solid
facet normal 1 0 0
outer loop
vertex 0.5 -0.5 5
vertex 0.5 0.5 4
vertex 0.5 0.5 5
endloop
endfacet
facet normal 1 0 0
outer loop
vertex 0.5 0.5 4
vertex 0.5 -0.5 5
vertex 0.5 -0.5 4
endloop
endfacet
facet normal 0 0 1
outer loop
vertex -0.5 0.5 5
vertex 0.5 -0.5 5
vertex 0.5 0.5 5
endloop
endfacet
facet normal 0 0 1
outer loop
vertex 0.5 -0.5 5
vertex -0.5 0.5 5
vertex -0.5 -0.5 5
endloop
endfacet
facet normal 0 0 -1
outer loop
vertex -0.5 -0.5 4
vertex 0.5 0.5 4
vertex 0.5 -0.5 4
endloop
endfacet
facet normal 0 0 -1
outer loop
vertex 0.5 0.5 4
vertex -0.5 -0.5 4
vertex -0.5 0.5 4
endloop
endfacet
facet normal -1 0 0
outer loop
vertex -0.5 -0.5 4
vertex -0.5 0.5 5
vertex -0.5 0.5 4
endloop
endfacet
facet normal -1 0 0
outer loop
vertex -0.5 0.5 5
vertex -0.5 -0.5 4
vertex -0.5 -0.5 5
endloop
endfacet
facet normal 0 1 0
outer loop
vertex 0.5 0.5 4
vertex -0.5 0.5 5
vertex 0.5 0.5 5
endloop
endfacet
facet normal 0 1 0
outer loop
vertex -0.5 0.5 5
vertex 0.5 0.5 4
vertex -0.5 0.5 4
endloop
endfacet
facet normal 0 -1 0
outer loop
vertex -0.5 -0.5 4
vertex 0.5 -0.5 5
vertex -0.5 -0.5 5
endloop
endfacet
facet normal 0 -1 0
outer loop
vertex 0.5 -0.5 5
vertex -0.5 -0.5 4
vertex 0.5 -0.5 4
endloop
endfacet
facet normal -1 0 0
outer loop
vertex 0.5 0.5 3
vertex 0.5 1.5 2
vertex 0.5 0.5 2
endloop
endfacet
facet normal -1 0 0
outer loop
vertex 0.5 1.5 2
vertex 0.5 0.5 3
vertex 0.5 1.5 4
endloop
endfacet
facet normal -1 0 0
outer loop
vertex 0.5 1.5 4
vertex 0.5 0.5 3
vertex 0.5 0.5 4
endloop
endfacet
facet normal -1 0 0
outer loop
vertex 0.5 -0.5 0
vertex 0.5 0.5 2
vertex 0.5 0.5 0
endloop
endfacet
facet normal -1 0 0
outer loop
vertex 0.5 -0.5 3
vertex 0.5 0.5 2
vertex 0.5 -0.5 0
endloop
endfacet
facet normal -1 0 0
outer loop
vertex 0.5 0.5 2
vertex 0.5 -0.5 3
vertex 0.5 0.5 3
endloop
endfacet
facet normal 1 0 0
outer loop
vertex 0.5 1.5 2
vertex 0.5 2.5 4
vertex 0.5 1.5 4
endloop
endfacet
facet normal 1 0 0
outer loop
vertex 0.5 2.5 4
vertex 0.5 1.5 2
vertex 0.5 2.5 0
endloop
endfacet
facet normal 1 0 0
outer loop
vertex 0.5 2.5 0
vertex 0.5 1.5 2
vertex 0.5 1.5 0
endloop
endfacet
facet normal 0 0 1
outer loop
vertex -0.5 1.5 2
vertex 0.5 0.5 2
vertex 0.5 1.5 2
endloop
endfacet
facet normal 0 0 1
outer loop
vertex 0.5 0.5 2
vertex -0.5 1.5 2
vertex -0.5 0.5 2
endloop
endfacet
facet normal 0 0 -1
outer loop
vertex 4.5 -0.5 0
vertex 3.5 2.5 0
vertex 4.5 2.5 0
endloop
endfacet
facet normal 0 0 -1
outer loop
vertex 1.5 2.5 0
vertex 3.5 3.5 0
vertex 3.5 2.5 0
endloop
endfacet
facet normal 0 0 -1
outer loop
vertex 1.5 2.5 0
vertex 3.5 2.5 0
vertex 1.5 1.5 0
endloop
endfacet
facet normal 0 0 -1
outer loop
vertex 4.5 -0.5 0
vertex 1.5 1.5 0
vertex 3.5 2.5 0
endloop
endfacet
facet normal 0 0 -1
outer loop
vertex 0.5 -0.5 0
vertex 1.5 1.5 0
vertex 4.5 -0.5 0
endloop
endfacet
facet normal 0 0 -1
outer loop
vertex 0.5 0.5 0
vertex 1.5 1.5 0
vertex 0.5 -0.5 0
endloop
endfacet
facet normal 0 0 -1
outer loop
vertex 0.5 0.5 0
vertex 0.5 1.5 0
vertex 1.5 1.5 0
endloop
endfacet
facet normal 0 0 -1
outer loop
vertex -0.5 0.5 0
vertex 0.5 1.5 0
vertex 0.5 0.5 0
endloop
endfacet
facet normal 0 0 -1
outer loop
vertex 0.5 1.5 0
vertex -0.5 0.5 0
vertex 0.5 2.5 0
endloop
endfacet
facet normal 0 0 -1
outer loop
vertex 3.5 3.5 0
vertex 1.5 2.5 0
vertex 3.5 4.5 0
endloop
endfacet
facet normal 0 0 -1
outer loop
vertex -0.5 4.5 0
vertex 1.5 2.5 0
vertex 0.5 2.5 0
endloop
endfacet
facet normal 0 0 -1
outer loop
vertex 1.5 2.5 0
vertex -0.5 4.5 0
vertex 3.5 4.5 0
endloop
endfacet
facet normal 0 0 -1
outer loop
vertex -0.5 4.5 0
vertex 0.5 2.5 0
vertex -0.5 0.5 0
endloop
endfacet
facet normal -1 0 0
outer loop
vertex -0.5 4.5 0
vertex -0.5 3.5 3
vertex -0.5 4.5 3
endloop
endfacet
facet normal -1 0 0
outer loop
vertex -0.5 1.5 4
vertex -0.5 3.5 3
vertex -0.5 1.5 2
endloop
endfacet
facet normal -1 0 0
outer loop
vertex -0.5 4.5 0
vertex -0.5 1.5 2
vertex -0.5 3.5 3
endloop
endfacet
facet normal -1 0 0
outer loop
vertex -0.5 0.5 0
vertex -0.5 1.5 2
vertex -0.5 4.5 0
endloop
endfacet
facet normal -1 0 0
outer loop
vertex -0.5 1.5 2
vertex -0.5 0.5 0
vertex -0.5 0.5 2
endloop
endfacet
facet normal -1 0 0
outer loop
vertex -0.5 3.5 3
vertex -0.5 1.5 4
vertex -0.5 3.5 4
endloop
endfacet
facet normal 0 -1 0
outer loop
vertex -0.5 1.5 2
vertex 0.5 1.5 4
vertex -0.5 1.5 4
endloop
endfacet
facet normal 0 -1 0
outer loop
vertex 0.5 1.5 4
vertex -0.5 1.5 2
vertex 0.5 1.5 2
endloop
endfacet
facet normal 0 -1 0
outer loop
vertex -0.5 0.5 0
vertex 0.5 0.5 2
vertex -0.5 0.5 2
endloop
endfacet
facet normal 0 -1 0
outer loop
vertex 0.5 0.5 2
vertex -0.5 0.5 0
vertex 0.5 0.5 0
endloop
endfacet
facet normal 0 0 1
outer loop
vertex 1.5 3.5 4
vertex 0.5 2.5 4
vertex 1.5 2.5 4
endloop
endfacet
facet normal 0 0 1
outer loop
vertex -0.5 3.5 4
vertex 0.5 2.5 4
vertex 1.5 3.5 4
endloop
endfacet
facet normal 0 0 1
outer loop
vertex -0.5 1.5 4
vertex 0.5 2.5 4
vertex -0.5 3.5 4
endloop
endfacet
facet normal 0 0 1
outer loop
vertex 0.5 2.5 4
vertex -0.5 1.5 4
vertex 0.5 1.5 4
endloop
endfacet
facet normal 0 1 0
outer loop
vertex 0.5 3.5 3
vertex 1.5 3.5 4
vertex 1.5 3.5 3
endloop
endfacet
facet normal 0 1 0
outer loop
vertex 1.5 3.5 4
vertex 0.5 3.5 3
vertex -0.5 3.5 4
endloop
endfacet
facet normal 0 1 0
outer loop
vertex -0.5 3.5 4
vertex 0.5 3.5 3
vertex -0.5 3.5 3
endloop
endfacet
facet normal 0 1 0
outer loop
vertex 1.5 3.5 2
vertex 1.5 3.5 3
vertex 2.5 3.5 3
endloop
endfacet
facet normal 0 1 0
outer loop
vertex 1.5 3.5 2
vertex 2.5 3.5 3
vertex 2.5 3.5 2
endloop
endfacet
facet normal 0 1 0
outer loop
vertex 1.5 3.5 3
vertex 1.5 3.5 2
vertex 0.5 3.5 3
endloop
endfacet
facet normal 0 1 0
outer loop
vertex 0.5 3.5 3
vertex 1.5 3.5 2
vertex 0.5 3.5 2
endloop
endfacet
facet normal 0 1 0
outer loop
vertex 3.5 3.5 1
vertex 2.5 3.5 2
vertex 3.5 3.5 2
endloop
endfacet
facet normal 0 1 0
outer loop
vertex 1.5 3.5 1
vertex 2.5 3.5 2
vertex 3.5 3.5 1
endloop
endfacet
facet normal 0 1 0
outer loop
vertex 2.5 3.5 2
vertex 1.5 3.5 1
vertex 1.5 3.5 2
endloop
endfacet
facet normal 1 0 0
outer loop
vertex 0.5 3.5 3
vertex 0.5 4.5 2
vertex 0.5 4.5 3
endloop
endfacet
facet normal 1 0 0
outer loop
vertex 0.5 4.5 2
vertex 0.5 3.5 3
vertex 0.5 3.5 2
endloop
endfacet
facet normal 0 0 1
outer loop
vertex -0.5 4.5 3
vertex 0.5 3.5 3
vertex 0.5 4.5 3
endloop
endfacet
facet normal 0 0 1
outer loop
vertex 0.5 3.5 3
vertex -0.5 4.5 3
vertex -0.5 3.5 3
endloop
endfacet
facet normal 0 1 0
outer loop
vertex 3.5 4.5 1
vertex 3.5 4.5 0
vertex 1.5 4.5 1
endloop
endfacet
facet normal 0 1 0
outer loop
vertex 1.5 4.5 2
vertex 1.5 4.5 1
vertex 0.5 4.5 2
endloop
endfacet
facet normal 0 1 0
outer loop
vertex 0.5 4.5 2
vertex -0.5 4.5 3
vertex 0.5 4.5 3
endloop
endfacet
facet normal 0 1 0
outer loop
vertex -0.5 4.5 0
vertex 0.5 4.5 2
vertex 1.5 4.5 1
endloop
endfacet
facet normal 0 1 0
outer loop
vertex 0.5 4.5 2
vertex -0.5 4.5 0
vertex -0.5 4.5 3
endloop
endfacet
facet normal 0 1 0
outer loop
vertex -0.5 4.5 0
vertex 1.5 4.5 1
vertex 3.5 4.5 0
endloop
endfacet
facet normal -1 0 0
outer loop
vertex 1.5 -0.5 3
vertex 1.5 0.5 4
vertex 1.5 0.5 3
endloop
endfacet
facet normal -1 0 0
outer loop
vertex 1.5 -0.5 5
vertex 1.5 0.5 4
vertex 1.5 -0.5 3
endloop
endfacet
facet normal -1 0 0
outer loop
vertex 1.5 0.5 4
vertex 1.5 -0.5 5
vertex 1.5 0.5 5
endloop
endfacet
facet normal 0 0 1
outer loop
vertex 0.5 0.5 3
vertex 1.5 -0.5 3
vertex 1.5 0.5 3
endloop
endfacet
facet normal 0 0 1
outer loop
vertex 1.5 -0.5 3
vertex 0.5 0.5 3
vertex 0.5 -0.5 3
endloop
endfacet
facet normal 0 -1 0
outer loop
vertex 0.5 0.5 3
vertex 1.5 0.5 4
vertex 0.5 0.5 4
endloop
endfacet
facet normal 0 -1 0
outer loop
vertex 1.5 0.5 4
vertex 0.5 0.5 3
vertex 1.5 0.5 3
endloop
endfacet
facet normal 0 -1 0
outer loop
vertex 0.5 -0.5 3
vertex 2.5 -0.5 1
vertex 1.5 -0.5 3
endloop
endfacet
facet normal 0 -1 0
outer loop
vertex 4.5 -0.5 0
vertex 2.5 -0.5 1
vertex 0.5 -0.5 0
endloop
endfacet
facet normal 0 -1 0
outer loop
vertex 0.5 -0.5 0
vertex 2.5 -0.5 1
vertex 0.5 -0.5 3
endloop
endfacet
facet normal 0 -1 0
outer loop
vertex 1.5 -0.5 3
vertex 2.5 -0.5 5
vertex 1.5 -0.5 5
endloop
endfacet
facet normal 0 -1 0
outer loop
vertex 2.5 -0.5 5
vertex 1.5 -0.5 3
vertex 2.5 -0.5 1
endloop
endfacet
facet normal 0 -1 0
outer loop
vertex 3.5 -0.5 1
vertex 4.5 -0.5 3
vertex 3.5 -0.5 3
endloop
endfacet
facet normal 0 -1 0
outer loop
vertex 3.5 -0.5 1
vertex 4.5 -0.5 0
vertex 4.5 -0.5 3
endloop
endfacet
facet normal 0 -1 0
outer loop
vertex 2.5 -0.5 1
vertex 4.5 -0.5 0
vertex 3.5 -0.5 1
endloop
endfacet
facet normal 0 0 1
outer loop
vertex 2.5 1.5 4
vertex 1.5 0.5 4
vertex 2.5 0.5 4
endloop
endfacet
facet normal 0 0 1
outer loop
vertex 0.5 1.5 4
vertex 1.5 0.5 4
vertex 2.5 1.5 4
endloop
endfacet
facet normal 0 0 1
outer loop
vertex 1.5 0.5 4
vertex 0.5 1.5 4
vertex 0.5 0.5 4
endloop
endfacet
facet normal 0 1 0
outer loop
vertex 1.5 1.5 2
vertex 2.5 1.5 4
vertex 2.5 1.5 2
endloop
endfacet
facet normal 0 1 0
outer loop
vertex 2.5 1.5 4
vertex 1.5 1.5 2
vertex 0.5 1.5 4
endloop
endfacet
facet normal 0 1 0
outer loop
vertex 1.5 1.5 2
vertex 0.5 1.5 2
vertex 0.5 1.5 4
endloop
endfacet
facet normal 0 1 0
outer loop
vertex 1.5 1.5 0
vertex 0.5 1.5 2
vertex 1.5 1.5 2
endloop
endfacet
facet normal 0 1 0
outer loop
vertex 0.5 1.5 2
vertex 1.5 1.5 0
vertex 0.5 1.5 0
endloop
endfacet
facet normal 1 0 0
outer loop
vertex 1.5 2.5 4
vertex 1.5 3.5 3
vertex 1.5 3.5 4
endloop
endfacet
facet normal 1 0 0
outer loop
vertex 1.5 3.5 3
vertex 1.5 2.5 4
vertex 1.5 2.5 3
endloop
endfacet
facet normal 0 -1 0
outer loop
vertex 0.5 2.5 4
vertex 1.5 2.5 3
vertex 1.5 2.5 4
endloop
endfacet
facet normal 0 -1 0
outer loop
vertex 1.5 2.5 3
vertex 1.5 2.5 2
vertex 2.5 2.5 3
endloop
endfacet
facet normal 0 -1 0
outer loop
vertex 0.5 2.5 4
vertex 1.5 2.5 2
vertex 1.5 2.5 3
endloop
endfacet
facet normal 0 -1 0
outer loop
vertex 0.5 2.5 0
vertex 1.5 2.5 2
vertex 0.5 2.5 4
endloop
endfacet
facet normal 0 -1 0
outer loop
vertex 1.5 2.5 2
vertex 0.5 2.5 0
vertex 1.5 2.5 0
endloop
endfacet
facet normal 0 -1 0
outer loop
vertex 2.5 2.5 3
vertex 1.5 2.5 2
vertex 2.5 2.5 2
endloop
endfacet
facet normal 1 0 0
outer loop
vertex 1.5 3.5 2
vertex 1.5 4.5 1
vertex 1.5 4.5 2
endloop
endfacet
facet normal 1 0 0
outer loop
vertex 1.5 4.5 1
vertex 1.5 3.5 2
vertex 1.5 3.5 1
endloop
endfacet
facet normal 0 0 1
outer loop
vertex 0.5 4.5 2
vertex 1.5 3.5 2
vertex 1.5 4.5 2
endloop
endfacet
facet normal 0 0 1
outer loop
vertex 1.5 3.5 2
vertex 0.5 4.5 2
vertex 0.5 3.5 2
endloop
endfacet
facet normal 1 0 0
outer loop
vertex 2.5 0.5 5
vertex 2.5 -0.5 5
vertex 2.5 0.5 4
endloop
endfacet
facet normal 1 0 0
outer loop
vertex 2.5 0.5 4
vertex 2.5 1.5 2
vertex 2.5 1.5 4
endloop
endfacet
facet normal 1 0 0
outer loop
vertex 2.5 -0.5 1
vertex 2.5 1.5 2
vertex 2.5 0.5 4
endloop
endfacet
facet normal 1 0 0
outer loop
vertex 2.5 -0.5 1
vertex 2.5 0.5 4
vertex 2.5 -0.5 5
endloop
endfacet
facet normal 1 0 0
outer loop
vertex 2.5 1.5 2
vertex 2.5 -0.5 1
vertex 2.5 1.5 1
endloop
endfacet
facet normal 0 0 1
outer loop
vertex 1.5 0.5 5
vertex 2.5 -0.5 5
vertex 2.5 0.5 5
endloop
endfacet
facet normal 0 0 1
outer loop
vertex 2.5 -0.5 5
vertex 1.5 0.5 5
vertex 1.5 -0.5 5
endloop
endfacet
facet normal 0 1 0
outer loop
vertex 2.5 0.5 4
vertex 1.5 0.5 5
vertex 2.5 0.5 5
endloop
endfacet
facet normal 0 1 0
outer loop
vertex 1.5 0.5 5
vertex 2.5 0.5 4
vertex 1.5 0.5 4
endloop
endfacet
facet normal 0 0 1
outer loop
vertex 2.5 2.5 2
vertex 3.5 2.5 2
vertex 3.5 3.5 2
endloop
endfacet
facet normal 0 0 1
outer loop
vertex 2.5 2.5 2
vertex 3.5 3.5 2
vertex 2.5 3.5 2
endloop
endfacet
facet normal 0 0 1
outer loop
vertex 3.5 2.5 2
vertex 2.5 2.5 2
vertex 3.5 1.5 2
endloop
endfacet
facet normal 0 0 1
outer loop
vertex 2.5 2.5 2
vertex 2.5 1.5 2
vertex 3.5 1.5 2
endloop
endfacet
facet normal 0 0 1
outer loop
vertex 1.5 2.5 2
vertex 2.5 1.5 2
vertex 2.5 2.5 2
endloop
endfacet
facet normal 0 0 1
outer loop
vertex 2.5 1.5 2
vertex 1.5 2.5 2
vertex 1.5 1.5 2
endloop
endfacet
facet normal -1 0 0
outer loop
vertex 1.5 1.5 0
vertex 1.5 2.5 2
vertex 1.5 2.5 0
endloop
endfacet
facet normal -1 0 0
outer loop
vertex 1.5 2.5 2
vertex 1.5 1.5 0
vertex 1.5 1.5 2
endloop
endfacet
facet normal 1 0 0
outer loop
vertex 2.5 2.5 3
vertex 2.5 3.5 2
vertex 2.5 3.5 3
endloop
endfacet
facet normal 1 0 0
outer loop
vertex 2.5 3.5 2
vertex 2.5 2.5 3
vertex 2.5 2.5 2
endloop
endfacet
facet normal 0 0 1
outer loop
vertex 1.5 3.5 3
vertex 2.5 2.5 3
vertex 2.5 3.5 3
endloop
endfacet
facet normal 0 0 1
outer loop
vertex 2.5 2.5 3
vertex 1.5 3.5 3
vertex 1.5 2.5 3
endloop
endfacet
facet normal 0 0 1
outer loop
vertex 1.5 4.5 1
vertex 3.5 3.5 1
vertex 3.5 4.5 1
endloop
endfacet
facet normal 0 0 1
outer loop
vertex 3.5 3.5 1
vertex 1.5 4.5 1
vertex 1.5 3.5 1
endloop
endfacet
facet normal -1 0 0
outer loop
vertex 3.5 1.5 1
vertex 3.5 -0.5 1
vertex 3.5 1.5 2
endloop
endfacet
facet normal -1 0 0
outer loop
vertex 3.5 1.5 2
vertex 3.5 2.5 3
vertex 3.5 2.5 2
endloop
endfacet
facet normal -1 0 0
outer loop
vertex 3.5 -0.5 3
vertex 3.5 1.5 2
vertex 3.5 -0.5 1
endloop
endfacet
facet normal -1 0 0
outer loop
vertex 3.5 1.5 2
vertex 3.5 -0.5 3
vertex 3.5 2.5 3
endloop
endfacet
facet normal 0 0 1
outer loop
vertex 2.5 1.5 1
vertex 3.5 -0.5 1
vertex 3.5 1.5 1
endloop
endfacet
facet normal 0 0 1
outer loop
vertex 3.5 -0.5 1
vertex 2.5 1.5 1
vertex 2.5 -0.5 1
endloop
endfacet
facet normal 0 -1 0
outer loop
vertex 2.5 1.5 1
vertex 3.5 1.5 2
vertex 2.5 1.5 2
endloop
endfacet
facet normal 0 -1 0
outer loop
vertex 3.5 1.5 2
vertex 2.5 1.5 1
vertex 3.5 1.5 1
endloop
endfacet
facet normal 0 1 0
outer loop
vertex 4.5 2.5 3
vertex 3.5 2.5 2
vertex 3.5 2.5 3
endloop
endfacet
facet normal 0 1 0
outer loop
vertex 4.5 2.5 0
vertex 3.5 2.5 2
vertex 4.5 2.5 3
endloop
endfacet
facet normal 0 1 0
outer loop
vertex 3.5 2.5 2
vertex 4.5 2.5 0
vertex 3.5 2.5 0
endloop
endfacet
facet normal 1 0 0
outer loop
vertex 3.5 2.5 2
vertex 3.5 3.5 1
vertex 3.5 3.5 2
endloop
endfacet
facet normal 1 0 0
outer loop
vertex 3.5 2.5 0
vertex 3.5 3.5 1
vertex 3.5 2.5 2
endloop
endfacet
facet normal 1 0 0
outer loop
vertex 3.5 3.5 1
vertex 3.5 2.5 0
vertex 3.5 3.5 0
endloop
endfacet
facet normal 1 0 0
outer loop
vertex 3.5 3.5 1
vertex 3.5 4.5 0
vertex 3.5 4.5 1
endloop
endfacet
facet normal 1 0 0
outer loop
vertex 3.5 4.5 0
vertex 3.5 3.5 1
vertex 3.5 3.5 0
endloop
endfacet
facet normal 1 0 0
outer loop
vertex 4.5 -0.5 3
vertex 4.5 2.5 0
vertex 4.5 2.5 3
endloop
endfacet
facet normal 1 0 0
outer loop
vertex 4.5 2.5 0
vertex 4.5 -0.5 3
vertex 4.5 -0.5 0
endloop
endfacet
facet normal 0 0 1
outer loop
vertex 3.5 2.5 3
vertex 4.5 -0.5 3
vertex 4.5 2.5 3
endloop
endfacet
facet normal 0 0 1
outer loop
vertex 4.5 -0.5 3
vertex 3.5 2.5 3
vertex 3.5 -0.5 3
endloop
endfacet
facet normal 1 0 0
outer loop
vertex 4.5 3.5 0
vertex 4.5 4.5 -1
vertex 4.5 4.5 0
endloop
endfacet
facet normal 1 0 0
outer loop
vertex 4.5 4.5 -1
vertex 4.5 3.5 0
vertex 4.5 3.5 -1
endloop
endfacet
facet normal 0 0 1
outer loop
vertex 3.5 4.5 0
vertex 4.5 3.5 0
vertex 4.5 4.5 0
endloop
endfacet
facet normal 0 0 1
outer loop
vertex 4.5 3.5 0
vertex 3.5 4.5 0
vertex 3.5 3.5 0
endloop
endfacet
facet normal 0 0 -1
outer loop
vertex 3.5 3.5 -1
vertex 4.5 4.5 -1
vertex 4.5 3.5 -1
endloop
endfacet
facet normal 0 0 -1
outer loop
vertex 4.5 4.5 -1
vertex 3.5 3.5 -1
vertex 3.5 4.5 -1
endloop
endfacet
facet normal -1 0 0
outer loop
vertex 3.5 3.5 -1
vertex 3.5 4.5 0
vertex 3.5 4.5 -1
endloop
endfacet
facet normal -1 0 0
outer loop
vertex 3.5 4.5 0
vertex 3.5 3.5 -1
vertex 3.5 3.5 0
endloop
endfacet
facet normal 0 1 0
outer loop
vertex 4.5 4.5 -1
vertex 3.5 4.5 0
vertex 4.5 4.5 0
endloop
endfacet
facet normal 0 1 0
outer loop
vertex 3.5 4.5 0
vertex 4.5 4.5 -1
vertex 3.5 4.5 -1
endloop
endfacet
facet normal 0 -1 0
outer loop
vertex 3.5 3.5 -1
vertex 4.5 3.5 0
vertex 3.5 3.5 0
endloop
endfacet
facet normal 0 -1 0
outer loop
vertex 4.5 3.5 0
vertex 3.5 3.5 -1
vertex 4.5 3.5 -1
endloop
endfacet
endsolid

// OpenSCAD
union() {
    translate([0, 0, 4.5]) color([1, 0, 0]) cube([1, 1, 1], center=true);
    translate([0, 1, 1.0]) cube([1, 1, 2], center=true);
    translate([0, 2, 2.0]) cube([1, 1, 4], center=true);
    translate([0, 3, 2.0]) cube([1, 1, 4], center=true);
    translate([0, 4, 1.5]) cube([1, 1, 3], center=true);
    translate([1, 0, 1.5]) cube([1, 1, 3], center=true);
    translate([1, 1, 2.0]) cube([1, 1, 4], center=true);
    translate([1, 3, 2.0]) cube([1, 1, 4], center=true);
    translate([1, 4, 1.0]) cube([1, 1, 2], center=true);
    translate([2, 0, 2.5]) cube([1, 1, 5], center=true);
    translate([2, 1, 2.0]) cube([1, 1, 4], center=true);
    translate([2, 2, 1.0]) cube([1, 1, 2], center=true);
    translate([2, 3, 1.5]) cube([1, 1, 3], center=true);
    translate([2, 4, 0.5]) cube([1, 1, 1], center=true);
    translate([3, 0, 0.5]) cube([1, 1, 1], center=true);
    translate([3, 1, 0.5]) cube([1, 1, 1], center=true);
    translate([3, 2, 1.0]) cube([1, 1, 2], center=true);
    translate([3, 3, 1.0]) cube([1, 1, 2], center=true);
    translate([3, 4, 0.5]) cube([1, 1, 1], center=true);
    translate([4, 0, 1.5]) cube([1, 1, 3], center=true);
    translate([4, 1, 1.5]) cube([1, 1, 3], center=true);
    translate([4, 2, 1.5]) cube([1, 1, 3], center=true);
    translate([4, 4, -0.5]) color([0, 0, 1]) cube([1, 1, 1], center=true);
}
